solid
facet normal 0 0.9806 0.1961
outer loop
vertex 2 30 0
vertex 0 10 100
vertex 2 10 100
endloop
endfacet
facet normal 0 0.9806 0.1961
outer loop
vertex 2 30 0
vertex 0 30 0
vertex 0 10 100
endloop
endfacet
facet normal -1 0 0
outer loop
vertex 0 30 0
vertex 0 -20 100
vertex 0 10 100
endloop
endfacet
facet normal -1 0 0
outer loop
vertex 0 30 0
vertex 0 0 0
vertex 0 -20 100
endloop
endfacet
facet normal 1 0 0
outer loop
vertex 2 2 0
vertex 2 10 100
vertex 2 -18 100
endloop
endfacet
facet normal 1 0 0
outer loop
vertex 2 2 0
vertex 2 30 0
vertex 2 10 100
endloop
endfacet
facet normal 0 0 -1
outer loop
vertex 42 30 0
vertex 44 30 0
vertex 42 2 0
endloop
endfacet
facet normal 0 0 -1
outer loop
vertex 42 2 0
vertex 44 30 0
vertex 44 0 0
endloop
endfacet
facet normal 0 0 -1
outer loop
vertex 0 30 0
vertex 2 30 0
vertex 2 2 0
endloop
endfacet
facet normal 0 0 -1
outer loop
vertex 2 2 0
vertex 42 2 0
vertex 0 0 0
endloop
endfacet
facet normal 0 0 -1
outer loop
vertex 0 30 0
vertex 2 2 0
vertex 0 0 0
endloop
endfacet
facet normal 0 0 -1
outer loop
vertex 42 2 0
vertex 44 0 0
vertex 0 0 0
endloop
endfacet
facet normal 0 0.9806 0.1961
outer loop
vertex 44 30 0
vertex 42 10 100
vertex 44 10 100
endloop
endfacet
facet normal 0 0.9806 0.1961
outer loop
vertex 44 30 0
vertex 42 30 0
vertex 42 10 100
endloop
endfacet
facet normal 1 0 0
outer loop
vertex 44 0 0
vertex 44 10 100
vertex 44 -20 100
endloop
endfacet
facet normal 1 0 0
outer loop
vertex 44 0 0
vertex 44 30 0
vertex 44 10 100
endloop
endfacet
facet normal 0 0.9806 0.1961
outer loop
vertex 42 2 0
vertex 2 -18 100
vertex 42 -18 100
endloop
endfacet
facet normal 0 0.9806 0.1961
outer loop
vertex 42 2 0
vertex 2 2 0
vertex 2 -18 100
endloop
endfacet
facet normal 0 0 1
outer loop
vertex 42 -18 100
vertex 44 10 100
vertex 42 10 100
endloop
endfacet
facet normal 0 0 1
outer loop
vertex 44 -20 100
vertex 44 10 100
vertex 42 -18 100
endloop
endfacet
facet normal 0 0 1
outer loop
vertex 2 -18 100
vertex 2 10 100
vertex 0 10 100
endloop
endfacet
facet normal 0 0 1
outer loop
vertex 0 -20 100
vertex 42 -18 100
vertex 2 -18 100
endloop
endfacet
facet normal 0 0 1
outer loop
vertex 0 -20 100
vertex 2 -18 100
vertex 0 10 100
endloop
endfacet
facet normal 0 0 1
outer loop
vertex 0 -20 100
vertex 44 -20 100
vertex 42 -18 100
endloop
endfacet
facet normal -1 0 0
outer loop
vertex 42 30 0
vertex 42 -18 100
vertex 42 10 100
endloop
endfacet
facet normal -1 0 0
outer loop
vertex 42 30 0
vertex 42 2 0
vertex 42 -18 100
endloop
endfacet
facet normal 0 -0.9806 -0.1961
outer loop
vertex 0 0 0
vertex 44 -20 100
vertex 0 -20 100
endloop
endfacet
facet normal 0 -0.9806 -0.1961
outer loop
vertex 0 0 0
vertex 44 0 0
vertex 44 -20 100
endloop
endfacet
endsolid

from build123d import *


with BuildPart() as part:
    # Sketch2 → Loft3 section 0
    with BuildSketch(Plane.XY.offset(100)):
        with BuildLine():
            Line((44, 10), (44, -20))
            Line((44, -20), (0, -20))
            Line((0, -20), (0, 10))
            Line((0, 10), (2, 10))
            Line((2, 10), (2, -18))
            Line((2, -18), (42, -18))
            Line((42, -18), (42, 10))
            Line((42, 10), (44, 10))
        make_face()
    # Sketch1 → Loft3 section 1
    with BuildSketch(Plane.XY):
        with BuildLine():
            Line((44, 30), (44, 0))
            Line((44, 0), (0, 0))
            Line((0, 0), (0, 30))
            Line((0, 30), (2, 30))
            Line((2, 30), (2, 2))
            Line((2, 2), (42, 2))
            Line((42, 2), (42, 30))
            Line((42, 30), (44, 30))
        make_face()
    loft()


solid = part.part
